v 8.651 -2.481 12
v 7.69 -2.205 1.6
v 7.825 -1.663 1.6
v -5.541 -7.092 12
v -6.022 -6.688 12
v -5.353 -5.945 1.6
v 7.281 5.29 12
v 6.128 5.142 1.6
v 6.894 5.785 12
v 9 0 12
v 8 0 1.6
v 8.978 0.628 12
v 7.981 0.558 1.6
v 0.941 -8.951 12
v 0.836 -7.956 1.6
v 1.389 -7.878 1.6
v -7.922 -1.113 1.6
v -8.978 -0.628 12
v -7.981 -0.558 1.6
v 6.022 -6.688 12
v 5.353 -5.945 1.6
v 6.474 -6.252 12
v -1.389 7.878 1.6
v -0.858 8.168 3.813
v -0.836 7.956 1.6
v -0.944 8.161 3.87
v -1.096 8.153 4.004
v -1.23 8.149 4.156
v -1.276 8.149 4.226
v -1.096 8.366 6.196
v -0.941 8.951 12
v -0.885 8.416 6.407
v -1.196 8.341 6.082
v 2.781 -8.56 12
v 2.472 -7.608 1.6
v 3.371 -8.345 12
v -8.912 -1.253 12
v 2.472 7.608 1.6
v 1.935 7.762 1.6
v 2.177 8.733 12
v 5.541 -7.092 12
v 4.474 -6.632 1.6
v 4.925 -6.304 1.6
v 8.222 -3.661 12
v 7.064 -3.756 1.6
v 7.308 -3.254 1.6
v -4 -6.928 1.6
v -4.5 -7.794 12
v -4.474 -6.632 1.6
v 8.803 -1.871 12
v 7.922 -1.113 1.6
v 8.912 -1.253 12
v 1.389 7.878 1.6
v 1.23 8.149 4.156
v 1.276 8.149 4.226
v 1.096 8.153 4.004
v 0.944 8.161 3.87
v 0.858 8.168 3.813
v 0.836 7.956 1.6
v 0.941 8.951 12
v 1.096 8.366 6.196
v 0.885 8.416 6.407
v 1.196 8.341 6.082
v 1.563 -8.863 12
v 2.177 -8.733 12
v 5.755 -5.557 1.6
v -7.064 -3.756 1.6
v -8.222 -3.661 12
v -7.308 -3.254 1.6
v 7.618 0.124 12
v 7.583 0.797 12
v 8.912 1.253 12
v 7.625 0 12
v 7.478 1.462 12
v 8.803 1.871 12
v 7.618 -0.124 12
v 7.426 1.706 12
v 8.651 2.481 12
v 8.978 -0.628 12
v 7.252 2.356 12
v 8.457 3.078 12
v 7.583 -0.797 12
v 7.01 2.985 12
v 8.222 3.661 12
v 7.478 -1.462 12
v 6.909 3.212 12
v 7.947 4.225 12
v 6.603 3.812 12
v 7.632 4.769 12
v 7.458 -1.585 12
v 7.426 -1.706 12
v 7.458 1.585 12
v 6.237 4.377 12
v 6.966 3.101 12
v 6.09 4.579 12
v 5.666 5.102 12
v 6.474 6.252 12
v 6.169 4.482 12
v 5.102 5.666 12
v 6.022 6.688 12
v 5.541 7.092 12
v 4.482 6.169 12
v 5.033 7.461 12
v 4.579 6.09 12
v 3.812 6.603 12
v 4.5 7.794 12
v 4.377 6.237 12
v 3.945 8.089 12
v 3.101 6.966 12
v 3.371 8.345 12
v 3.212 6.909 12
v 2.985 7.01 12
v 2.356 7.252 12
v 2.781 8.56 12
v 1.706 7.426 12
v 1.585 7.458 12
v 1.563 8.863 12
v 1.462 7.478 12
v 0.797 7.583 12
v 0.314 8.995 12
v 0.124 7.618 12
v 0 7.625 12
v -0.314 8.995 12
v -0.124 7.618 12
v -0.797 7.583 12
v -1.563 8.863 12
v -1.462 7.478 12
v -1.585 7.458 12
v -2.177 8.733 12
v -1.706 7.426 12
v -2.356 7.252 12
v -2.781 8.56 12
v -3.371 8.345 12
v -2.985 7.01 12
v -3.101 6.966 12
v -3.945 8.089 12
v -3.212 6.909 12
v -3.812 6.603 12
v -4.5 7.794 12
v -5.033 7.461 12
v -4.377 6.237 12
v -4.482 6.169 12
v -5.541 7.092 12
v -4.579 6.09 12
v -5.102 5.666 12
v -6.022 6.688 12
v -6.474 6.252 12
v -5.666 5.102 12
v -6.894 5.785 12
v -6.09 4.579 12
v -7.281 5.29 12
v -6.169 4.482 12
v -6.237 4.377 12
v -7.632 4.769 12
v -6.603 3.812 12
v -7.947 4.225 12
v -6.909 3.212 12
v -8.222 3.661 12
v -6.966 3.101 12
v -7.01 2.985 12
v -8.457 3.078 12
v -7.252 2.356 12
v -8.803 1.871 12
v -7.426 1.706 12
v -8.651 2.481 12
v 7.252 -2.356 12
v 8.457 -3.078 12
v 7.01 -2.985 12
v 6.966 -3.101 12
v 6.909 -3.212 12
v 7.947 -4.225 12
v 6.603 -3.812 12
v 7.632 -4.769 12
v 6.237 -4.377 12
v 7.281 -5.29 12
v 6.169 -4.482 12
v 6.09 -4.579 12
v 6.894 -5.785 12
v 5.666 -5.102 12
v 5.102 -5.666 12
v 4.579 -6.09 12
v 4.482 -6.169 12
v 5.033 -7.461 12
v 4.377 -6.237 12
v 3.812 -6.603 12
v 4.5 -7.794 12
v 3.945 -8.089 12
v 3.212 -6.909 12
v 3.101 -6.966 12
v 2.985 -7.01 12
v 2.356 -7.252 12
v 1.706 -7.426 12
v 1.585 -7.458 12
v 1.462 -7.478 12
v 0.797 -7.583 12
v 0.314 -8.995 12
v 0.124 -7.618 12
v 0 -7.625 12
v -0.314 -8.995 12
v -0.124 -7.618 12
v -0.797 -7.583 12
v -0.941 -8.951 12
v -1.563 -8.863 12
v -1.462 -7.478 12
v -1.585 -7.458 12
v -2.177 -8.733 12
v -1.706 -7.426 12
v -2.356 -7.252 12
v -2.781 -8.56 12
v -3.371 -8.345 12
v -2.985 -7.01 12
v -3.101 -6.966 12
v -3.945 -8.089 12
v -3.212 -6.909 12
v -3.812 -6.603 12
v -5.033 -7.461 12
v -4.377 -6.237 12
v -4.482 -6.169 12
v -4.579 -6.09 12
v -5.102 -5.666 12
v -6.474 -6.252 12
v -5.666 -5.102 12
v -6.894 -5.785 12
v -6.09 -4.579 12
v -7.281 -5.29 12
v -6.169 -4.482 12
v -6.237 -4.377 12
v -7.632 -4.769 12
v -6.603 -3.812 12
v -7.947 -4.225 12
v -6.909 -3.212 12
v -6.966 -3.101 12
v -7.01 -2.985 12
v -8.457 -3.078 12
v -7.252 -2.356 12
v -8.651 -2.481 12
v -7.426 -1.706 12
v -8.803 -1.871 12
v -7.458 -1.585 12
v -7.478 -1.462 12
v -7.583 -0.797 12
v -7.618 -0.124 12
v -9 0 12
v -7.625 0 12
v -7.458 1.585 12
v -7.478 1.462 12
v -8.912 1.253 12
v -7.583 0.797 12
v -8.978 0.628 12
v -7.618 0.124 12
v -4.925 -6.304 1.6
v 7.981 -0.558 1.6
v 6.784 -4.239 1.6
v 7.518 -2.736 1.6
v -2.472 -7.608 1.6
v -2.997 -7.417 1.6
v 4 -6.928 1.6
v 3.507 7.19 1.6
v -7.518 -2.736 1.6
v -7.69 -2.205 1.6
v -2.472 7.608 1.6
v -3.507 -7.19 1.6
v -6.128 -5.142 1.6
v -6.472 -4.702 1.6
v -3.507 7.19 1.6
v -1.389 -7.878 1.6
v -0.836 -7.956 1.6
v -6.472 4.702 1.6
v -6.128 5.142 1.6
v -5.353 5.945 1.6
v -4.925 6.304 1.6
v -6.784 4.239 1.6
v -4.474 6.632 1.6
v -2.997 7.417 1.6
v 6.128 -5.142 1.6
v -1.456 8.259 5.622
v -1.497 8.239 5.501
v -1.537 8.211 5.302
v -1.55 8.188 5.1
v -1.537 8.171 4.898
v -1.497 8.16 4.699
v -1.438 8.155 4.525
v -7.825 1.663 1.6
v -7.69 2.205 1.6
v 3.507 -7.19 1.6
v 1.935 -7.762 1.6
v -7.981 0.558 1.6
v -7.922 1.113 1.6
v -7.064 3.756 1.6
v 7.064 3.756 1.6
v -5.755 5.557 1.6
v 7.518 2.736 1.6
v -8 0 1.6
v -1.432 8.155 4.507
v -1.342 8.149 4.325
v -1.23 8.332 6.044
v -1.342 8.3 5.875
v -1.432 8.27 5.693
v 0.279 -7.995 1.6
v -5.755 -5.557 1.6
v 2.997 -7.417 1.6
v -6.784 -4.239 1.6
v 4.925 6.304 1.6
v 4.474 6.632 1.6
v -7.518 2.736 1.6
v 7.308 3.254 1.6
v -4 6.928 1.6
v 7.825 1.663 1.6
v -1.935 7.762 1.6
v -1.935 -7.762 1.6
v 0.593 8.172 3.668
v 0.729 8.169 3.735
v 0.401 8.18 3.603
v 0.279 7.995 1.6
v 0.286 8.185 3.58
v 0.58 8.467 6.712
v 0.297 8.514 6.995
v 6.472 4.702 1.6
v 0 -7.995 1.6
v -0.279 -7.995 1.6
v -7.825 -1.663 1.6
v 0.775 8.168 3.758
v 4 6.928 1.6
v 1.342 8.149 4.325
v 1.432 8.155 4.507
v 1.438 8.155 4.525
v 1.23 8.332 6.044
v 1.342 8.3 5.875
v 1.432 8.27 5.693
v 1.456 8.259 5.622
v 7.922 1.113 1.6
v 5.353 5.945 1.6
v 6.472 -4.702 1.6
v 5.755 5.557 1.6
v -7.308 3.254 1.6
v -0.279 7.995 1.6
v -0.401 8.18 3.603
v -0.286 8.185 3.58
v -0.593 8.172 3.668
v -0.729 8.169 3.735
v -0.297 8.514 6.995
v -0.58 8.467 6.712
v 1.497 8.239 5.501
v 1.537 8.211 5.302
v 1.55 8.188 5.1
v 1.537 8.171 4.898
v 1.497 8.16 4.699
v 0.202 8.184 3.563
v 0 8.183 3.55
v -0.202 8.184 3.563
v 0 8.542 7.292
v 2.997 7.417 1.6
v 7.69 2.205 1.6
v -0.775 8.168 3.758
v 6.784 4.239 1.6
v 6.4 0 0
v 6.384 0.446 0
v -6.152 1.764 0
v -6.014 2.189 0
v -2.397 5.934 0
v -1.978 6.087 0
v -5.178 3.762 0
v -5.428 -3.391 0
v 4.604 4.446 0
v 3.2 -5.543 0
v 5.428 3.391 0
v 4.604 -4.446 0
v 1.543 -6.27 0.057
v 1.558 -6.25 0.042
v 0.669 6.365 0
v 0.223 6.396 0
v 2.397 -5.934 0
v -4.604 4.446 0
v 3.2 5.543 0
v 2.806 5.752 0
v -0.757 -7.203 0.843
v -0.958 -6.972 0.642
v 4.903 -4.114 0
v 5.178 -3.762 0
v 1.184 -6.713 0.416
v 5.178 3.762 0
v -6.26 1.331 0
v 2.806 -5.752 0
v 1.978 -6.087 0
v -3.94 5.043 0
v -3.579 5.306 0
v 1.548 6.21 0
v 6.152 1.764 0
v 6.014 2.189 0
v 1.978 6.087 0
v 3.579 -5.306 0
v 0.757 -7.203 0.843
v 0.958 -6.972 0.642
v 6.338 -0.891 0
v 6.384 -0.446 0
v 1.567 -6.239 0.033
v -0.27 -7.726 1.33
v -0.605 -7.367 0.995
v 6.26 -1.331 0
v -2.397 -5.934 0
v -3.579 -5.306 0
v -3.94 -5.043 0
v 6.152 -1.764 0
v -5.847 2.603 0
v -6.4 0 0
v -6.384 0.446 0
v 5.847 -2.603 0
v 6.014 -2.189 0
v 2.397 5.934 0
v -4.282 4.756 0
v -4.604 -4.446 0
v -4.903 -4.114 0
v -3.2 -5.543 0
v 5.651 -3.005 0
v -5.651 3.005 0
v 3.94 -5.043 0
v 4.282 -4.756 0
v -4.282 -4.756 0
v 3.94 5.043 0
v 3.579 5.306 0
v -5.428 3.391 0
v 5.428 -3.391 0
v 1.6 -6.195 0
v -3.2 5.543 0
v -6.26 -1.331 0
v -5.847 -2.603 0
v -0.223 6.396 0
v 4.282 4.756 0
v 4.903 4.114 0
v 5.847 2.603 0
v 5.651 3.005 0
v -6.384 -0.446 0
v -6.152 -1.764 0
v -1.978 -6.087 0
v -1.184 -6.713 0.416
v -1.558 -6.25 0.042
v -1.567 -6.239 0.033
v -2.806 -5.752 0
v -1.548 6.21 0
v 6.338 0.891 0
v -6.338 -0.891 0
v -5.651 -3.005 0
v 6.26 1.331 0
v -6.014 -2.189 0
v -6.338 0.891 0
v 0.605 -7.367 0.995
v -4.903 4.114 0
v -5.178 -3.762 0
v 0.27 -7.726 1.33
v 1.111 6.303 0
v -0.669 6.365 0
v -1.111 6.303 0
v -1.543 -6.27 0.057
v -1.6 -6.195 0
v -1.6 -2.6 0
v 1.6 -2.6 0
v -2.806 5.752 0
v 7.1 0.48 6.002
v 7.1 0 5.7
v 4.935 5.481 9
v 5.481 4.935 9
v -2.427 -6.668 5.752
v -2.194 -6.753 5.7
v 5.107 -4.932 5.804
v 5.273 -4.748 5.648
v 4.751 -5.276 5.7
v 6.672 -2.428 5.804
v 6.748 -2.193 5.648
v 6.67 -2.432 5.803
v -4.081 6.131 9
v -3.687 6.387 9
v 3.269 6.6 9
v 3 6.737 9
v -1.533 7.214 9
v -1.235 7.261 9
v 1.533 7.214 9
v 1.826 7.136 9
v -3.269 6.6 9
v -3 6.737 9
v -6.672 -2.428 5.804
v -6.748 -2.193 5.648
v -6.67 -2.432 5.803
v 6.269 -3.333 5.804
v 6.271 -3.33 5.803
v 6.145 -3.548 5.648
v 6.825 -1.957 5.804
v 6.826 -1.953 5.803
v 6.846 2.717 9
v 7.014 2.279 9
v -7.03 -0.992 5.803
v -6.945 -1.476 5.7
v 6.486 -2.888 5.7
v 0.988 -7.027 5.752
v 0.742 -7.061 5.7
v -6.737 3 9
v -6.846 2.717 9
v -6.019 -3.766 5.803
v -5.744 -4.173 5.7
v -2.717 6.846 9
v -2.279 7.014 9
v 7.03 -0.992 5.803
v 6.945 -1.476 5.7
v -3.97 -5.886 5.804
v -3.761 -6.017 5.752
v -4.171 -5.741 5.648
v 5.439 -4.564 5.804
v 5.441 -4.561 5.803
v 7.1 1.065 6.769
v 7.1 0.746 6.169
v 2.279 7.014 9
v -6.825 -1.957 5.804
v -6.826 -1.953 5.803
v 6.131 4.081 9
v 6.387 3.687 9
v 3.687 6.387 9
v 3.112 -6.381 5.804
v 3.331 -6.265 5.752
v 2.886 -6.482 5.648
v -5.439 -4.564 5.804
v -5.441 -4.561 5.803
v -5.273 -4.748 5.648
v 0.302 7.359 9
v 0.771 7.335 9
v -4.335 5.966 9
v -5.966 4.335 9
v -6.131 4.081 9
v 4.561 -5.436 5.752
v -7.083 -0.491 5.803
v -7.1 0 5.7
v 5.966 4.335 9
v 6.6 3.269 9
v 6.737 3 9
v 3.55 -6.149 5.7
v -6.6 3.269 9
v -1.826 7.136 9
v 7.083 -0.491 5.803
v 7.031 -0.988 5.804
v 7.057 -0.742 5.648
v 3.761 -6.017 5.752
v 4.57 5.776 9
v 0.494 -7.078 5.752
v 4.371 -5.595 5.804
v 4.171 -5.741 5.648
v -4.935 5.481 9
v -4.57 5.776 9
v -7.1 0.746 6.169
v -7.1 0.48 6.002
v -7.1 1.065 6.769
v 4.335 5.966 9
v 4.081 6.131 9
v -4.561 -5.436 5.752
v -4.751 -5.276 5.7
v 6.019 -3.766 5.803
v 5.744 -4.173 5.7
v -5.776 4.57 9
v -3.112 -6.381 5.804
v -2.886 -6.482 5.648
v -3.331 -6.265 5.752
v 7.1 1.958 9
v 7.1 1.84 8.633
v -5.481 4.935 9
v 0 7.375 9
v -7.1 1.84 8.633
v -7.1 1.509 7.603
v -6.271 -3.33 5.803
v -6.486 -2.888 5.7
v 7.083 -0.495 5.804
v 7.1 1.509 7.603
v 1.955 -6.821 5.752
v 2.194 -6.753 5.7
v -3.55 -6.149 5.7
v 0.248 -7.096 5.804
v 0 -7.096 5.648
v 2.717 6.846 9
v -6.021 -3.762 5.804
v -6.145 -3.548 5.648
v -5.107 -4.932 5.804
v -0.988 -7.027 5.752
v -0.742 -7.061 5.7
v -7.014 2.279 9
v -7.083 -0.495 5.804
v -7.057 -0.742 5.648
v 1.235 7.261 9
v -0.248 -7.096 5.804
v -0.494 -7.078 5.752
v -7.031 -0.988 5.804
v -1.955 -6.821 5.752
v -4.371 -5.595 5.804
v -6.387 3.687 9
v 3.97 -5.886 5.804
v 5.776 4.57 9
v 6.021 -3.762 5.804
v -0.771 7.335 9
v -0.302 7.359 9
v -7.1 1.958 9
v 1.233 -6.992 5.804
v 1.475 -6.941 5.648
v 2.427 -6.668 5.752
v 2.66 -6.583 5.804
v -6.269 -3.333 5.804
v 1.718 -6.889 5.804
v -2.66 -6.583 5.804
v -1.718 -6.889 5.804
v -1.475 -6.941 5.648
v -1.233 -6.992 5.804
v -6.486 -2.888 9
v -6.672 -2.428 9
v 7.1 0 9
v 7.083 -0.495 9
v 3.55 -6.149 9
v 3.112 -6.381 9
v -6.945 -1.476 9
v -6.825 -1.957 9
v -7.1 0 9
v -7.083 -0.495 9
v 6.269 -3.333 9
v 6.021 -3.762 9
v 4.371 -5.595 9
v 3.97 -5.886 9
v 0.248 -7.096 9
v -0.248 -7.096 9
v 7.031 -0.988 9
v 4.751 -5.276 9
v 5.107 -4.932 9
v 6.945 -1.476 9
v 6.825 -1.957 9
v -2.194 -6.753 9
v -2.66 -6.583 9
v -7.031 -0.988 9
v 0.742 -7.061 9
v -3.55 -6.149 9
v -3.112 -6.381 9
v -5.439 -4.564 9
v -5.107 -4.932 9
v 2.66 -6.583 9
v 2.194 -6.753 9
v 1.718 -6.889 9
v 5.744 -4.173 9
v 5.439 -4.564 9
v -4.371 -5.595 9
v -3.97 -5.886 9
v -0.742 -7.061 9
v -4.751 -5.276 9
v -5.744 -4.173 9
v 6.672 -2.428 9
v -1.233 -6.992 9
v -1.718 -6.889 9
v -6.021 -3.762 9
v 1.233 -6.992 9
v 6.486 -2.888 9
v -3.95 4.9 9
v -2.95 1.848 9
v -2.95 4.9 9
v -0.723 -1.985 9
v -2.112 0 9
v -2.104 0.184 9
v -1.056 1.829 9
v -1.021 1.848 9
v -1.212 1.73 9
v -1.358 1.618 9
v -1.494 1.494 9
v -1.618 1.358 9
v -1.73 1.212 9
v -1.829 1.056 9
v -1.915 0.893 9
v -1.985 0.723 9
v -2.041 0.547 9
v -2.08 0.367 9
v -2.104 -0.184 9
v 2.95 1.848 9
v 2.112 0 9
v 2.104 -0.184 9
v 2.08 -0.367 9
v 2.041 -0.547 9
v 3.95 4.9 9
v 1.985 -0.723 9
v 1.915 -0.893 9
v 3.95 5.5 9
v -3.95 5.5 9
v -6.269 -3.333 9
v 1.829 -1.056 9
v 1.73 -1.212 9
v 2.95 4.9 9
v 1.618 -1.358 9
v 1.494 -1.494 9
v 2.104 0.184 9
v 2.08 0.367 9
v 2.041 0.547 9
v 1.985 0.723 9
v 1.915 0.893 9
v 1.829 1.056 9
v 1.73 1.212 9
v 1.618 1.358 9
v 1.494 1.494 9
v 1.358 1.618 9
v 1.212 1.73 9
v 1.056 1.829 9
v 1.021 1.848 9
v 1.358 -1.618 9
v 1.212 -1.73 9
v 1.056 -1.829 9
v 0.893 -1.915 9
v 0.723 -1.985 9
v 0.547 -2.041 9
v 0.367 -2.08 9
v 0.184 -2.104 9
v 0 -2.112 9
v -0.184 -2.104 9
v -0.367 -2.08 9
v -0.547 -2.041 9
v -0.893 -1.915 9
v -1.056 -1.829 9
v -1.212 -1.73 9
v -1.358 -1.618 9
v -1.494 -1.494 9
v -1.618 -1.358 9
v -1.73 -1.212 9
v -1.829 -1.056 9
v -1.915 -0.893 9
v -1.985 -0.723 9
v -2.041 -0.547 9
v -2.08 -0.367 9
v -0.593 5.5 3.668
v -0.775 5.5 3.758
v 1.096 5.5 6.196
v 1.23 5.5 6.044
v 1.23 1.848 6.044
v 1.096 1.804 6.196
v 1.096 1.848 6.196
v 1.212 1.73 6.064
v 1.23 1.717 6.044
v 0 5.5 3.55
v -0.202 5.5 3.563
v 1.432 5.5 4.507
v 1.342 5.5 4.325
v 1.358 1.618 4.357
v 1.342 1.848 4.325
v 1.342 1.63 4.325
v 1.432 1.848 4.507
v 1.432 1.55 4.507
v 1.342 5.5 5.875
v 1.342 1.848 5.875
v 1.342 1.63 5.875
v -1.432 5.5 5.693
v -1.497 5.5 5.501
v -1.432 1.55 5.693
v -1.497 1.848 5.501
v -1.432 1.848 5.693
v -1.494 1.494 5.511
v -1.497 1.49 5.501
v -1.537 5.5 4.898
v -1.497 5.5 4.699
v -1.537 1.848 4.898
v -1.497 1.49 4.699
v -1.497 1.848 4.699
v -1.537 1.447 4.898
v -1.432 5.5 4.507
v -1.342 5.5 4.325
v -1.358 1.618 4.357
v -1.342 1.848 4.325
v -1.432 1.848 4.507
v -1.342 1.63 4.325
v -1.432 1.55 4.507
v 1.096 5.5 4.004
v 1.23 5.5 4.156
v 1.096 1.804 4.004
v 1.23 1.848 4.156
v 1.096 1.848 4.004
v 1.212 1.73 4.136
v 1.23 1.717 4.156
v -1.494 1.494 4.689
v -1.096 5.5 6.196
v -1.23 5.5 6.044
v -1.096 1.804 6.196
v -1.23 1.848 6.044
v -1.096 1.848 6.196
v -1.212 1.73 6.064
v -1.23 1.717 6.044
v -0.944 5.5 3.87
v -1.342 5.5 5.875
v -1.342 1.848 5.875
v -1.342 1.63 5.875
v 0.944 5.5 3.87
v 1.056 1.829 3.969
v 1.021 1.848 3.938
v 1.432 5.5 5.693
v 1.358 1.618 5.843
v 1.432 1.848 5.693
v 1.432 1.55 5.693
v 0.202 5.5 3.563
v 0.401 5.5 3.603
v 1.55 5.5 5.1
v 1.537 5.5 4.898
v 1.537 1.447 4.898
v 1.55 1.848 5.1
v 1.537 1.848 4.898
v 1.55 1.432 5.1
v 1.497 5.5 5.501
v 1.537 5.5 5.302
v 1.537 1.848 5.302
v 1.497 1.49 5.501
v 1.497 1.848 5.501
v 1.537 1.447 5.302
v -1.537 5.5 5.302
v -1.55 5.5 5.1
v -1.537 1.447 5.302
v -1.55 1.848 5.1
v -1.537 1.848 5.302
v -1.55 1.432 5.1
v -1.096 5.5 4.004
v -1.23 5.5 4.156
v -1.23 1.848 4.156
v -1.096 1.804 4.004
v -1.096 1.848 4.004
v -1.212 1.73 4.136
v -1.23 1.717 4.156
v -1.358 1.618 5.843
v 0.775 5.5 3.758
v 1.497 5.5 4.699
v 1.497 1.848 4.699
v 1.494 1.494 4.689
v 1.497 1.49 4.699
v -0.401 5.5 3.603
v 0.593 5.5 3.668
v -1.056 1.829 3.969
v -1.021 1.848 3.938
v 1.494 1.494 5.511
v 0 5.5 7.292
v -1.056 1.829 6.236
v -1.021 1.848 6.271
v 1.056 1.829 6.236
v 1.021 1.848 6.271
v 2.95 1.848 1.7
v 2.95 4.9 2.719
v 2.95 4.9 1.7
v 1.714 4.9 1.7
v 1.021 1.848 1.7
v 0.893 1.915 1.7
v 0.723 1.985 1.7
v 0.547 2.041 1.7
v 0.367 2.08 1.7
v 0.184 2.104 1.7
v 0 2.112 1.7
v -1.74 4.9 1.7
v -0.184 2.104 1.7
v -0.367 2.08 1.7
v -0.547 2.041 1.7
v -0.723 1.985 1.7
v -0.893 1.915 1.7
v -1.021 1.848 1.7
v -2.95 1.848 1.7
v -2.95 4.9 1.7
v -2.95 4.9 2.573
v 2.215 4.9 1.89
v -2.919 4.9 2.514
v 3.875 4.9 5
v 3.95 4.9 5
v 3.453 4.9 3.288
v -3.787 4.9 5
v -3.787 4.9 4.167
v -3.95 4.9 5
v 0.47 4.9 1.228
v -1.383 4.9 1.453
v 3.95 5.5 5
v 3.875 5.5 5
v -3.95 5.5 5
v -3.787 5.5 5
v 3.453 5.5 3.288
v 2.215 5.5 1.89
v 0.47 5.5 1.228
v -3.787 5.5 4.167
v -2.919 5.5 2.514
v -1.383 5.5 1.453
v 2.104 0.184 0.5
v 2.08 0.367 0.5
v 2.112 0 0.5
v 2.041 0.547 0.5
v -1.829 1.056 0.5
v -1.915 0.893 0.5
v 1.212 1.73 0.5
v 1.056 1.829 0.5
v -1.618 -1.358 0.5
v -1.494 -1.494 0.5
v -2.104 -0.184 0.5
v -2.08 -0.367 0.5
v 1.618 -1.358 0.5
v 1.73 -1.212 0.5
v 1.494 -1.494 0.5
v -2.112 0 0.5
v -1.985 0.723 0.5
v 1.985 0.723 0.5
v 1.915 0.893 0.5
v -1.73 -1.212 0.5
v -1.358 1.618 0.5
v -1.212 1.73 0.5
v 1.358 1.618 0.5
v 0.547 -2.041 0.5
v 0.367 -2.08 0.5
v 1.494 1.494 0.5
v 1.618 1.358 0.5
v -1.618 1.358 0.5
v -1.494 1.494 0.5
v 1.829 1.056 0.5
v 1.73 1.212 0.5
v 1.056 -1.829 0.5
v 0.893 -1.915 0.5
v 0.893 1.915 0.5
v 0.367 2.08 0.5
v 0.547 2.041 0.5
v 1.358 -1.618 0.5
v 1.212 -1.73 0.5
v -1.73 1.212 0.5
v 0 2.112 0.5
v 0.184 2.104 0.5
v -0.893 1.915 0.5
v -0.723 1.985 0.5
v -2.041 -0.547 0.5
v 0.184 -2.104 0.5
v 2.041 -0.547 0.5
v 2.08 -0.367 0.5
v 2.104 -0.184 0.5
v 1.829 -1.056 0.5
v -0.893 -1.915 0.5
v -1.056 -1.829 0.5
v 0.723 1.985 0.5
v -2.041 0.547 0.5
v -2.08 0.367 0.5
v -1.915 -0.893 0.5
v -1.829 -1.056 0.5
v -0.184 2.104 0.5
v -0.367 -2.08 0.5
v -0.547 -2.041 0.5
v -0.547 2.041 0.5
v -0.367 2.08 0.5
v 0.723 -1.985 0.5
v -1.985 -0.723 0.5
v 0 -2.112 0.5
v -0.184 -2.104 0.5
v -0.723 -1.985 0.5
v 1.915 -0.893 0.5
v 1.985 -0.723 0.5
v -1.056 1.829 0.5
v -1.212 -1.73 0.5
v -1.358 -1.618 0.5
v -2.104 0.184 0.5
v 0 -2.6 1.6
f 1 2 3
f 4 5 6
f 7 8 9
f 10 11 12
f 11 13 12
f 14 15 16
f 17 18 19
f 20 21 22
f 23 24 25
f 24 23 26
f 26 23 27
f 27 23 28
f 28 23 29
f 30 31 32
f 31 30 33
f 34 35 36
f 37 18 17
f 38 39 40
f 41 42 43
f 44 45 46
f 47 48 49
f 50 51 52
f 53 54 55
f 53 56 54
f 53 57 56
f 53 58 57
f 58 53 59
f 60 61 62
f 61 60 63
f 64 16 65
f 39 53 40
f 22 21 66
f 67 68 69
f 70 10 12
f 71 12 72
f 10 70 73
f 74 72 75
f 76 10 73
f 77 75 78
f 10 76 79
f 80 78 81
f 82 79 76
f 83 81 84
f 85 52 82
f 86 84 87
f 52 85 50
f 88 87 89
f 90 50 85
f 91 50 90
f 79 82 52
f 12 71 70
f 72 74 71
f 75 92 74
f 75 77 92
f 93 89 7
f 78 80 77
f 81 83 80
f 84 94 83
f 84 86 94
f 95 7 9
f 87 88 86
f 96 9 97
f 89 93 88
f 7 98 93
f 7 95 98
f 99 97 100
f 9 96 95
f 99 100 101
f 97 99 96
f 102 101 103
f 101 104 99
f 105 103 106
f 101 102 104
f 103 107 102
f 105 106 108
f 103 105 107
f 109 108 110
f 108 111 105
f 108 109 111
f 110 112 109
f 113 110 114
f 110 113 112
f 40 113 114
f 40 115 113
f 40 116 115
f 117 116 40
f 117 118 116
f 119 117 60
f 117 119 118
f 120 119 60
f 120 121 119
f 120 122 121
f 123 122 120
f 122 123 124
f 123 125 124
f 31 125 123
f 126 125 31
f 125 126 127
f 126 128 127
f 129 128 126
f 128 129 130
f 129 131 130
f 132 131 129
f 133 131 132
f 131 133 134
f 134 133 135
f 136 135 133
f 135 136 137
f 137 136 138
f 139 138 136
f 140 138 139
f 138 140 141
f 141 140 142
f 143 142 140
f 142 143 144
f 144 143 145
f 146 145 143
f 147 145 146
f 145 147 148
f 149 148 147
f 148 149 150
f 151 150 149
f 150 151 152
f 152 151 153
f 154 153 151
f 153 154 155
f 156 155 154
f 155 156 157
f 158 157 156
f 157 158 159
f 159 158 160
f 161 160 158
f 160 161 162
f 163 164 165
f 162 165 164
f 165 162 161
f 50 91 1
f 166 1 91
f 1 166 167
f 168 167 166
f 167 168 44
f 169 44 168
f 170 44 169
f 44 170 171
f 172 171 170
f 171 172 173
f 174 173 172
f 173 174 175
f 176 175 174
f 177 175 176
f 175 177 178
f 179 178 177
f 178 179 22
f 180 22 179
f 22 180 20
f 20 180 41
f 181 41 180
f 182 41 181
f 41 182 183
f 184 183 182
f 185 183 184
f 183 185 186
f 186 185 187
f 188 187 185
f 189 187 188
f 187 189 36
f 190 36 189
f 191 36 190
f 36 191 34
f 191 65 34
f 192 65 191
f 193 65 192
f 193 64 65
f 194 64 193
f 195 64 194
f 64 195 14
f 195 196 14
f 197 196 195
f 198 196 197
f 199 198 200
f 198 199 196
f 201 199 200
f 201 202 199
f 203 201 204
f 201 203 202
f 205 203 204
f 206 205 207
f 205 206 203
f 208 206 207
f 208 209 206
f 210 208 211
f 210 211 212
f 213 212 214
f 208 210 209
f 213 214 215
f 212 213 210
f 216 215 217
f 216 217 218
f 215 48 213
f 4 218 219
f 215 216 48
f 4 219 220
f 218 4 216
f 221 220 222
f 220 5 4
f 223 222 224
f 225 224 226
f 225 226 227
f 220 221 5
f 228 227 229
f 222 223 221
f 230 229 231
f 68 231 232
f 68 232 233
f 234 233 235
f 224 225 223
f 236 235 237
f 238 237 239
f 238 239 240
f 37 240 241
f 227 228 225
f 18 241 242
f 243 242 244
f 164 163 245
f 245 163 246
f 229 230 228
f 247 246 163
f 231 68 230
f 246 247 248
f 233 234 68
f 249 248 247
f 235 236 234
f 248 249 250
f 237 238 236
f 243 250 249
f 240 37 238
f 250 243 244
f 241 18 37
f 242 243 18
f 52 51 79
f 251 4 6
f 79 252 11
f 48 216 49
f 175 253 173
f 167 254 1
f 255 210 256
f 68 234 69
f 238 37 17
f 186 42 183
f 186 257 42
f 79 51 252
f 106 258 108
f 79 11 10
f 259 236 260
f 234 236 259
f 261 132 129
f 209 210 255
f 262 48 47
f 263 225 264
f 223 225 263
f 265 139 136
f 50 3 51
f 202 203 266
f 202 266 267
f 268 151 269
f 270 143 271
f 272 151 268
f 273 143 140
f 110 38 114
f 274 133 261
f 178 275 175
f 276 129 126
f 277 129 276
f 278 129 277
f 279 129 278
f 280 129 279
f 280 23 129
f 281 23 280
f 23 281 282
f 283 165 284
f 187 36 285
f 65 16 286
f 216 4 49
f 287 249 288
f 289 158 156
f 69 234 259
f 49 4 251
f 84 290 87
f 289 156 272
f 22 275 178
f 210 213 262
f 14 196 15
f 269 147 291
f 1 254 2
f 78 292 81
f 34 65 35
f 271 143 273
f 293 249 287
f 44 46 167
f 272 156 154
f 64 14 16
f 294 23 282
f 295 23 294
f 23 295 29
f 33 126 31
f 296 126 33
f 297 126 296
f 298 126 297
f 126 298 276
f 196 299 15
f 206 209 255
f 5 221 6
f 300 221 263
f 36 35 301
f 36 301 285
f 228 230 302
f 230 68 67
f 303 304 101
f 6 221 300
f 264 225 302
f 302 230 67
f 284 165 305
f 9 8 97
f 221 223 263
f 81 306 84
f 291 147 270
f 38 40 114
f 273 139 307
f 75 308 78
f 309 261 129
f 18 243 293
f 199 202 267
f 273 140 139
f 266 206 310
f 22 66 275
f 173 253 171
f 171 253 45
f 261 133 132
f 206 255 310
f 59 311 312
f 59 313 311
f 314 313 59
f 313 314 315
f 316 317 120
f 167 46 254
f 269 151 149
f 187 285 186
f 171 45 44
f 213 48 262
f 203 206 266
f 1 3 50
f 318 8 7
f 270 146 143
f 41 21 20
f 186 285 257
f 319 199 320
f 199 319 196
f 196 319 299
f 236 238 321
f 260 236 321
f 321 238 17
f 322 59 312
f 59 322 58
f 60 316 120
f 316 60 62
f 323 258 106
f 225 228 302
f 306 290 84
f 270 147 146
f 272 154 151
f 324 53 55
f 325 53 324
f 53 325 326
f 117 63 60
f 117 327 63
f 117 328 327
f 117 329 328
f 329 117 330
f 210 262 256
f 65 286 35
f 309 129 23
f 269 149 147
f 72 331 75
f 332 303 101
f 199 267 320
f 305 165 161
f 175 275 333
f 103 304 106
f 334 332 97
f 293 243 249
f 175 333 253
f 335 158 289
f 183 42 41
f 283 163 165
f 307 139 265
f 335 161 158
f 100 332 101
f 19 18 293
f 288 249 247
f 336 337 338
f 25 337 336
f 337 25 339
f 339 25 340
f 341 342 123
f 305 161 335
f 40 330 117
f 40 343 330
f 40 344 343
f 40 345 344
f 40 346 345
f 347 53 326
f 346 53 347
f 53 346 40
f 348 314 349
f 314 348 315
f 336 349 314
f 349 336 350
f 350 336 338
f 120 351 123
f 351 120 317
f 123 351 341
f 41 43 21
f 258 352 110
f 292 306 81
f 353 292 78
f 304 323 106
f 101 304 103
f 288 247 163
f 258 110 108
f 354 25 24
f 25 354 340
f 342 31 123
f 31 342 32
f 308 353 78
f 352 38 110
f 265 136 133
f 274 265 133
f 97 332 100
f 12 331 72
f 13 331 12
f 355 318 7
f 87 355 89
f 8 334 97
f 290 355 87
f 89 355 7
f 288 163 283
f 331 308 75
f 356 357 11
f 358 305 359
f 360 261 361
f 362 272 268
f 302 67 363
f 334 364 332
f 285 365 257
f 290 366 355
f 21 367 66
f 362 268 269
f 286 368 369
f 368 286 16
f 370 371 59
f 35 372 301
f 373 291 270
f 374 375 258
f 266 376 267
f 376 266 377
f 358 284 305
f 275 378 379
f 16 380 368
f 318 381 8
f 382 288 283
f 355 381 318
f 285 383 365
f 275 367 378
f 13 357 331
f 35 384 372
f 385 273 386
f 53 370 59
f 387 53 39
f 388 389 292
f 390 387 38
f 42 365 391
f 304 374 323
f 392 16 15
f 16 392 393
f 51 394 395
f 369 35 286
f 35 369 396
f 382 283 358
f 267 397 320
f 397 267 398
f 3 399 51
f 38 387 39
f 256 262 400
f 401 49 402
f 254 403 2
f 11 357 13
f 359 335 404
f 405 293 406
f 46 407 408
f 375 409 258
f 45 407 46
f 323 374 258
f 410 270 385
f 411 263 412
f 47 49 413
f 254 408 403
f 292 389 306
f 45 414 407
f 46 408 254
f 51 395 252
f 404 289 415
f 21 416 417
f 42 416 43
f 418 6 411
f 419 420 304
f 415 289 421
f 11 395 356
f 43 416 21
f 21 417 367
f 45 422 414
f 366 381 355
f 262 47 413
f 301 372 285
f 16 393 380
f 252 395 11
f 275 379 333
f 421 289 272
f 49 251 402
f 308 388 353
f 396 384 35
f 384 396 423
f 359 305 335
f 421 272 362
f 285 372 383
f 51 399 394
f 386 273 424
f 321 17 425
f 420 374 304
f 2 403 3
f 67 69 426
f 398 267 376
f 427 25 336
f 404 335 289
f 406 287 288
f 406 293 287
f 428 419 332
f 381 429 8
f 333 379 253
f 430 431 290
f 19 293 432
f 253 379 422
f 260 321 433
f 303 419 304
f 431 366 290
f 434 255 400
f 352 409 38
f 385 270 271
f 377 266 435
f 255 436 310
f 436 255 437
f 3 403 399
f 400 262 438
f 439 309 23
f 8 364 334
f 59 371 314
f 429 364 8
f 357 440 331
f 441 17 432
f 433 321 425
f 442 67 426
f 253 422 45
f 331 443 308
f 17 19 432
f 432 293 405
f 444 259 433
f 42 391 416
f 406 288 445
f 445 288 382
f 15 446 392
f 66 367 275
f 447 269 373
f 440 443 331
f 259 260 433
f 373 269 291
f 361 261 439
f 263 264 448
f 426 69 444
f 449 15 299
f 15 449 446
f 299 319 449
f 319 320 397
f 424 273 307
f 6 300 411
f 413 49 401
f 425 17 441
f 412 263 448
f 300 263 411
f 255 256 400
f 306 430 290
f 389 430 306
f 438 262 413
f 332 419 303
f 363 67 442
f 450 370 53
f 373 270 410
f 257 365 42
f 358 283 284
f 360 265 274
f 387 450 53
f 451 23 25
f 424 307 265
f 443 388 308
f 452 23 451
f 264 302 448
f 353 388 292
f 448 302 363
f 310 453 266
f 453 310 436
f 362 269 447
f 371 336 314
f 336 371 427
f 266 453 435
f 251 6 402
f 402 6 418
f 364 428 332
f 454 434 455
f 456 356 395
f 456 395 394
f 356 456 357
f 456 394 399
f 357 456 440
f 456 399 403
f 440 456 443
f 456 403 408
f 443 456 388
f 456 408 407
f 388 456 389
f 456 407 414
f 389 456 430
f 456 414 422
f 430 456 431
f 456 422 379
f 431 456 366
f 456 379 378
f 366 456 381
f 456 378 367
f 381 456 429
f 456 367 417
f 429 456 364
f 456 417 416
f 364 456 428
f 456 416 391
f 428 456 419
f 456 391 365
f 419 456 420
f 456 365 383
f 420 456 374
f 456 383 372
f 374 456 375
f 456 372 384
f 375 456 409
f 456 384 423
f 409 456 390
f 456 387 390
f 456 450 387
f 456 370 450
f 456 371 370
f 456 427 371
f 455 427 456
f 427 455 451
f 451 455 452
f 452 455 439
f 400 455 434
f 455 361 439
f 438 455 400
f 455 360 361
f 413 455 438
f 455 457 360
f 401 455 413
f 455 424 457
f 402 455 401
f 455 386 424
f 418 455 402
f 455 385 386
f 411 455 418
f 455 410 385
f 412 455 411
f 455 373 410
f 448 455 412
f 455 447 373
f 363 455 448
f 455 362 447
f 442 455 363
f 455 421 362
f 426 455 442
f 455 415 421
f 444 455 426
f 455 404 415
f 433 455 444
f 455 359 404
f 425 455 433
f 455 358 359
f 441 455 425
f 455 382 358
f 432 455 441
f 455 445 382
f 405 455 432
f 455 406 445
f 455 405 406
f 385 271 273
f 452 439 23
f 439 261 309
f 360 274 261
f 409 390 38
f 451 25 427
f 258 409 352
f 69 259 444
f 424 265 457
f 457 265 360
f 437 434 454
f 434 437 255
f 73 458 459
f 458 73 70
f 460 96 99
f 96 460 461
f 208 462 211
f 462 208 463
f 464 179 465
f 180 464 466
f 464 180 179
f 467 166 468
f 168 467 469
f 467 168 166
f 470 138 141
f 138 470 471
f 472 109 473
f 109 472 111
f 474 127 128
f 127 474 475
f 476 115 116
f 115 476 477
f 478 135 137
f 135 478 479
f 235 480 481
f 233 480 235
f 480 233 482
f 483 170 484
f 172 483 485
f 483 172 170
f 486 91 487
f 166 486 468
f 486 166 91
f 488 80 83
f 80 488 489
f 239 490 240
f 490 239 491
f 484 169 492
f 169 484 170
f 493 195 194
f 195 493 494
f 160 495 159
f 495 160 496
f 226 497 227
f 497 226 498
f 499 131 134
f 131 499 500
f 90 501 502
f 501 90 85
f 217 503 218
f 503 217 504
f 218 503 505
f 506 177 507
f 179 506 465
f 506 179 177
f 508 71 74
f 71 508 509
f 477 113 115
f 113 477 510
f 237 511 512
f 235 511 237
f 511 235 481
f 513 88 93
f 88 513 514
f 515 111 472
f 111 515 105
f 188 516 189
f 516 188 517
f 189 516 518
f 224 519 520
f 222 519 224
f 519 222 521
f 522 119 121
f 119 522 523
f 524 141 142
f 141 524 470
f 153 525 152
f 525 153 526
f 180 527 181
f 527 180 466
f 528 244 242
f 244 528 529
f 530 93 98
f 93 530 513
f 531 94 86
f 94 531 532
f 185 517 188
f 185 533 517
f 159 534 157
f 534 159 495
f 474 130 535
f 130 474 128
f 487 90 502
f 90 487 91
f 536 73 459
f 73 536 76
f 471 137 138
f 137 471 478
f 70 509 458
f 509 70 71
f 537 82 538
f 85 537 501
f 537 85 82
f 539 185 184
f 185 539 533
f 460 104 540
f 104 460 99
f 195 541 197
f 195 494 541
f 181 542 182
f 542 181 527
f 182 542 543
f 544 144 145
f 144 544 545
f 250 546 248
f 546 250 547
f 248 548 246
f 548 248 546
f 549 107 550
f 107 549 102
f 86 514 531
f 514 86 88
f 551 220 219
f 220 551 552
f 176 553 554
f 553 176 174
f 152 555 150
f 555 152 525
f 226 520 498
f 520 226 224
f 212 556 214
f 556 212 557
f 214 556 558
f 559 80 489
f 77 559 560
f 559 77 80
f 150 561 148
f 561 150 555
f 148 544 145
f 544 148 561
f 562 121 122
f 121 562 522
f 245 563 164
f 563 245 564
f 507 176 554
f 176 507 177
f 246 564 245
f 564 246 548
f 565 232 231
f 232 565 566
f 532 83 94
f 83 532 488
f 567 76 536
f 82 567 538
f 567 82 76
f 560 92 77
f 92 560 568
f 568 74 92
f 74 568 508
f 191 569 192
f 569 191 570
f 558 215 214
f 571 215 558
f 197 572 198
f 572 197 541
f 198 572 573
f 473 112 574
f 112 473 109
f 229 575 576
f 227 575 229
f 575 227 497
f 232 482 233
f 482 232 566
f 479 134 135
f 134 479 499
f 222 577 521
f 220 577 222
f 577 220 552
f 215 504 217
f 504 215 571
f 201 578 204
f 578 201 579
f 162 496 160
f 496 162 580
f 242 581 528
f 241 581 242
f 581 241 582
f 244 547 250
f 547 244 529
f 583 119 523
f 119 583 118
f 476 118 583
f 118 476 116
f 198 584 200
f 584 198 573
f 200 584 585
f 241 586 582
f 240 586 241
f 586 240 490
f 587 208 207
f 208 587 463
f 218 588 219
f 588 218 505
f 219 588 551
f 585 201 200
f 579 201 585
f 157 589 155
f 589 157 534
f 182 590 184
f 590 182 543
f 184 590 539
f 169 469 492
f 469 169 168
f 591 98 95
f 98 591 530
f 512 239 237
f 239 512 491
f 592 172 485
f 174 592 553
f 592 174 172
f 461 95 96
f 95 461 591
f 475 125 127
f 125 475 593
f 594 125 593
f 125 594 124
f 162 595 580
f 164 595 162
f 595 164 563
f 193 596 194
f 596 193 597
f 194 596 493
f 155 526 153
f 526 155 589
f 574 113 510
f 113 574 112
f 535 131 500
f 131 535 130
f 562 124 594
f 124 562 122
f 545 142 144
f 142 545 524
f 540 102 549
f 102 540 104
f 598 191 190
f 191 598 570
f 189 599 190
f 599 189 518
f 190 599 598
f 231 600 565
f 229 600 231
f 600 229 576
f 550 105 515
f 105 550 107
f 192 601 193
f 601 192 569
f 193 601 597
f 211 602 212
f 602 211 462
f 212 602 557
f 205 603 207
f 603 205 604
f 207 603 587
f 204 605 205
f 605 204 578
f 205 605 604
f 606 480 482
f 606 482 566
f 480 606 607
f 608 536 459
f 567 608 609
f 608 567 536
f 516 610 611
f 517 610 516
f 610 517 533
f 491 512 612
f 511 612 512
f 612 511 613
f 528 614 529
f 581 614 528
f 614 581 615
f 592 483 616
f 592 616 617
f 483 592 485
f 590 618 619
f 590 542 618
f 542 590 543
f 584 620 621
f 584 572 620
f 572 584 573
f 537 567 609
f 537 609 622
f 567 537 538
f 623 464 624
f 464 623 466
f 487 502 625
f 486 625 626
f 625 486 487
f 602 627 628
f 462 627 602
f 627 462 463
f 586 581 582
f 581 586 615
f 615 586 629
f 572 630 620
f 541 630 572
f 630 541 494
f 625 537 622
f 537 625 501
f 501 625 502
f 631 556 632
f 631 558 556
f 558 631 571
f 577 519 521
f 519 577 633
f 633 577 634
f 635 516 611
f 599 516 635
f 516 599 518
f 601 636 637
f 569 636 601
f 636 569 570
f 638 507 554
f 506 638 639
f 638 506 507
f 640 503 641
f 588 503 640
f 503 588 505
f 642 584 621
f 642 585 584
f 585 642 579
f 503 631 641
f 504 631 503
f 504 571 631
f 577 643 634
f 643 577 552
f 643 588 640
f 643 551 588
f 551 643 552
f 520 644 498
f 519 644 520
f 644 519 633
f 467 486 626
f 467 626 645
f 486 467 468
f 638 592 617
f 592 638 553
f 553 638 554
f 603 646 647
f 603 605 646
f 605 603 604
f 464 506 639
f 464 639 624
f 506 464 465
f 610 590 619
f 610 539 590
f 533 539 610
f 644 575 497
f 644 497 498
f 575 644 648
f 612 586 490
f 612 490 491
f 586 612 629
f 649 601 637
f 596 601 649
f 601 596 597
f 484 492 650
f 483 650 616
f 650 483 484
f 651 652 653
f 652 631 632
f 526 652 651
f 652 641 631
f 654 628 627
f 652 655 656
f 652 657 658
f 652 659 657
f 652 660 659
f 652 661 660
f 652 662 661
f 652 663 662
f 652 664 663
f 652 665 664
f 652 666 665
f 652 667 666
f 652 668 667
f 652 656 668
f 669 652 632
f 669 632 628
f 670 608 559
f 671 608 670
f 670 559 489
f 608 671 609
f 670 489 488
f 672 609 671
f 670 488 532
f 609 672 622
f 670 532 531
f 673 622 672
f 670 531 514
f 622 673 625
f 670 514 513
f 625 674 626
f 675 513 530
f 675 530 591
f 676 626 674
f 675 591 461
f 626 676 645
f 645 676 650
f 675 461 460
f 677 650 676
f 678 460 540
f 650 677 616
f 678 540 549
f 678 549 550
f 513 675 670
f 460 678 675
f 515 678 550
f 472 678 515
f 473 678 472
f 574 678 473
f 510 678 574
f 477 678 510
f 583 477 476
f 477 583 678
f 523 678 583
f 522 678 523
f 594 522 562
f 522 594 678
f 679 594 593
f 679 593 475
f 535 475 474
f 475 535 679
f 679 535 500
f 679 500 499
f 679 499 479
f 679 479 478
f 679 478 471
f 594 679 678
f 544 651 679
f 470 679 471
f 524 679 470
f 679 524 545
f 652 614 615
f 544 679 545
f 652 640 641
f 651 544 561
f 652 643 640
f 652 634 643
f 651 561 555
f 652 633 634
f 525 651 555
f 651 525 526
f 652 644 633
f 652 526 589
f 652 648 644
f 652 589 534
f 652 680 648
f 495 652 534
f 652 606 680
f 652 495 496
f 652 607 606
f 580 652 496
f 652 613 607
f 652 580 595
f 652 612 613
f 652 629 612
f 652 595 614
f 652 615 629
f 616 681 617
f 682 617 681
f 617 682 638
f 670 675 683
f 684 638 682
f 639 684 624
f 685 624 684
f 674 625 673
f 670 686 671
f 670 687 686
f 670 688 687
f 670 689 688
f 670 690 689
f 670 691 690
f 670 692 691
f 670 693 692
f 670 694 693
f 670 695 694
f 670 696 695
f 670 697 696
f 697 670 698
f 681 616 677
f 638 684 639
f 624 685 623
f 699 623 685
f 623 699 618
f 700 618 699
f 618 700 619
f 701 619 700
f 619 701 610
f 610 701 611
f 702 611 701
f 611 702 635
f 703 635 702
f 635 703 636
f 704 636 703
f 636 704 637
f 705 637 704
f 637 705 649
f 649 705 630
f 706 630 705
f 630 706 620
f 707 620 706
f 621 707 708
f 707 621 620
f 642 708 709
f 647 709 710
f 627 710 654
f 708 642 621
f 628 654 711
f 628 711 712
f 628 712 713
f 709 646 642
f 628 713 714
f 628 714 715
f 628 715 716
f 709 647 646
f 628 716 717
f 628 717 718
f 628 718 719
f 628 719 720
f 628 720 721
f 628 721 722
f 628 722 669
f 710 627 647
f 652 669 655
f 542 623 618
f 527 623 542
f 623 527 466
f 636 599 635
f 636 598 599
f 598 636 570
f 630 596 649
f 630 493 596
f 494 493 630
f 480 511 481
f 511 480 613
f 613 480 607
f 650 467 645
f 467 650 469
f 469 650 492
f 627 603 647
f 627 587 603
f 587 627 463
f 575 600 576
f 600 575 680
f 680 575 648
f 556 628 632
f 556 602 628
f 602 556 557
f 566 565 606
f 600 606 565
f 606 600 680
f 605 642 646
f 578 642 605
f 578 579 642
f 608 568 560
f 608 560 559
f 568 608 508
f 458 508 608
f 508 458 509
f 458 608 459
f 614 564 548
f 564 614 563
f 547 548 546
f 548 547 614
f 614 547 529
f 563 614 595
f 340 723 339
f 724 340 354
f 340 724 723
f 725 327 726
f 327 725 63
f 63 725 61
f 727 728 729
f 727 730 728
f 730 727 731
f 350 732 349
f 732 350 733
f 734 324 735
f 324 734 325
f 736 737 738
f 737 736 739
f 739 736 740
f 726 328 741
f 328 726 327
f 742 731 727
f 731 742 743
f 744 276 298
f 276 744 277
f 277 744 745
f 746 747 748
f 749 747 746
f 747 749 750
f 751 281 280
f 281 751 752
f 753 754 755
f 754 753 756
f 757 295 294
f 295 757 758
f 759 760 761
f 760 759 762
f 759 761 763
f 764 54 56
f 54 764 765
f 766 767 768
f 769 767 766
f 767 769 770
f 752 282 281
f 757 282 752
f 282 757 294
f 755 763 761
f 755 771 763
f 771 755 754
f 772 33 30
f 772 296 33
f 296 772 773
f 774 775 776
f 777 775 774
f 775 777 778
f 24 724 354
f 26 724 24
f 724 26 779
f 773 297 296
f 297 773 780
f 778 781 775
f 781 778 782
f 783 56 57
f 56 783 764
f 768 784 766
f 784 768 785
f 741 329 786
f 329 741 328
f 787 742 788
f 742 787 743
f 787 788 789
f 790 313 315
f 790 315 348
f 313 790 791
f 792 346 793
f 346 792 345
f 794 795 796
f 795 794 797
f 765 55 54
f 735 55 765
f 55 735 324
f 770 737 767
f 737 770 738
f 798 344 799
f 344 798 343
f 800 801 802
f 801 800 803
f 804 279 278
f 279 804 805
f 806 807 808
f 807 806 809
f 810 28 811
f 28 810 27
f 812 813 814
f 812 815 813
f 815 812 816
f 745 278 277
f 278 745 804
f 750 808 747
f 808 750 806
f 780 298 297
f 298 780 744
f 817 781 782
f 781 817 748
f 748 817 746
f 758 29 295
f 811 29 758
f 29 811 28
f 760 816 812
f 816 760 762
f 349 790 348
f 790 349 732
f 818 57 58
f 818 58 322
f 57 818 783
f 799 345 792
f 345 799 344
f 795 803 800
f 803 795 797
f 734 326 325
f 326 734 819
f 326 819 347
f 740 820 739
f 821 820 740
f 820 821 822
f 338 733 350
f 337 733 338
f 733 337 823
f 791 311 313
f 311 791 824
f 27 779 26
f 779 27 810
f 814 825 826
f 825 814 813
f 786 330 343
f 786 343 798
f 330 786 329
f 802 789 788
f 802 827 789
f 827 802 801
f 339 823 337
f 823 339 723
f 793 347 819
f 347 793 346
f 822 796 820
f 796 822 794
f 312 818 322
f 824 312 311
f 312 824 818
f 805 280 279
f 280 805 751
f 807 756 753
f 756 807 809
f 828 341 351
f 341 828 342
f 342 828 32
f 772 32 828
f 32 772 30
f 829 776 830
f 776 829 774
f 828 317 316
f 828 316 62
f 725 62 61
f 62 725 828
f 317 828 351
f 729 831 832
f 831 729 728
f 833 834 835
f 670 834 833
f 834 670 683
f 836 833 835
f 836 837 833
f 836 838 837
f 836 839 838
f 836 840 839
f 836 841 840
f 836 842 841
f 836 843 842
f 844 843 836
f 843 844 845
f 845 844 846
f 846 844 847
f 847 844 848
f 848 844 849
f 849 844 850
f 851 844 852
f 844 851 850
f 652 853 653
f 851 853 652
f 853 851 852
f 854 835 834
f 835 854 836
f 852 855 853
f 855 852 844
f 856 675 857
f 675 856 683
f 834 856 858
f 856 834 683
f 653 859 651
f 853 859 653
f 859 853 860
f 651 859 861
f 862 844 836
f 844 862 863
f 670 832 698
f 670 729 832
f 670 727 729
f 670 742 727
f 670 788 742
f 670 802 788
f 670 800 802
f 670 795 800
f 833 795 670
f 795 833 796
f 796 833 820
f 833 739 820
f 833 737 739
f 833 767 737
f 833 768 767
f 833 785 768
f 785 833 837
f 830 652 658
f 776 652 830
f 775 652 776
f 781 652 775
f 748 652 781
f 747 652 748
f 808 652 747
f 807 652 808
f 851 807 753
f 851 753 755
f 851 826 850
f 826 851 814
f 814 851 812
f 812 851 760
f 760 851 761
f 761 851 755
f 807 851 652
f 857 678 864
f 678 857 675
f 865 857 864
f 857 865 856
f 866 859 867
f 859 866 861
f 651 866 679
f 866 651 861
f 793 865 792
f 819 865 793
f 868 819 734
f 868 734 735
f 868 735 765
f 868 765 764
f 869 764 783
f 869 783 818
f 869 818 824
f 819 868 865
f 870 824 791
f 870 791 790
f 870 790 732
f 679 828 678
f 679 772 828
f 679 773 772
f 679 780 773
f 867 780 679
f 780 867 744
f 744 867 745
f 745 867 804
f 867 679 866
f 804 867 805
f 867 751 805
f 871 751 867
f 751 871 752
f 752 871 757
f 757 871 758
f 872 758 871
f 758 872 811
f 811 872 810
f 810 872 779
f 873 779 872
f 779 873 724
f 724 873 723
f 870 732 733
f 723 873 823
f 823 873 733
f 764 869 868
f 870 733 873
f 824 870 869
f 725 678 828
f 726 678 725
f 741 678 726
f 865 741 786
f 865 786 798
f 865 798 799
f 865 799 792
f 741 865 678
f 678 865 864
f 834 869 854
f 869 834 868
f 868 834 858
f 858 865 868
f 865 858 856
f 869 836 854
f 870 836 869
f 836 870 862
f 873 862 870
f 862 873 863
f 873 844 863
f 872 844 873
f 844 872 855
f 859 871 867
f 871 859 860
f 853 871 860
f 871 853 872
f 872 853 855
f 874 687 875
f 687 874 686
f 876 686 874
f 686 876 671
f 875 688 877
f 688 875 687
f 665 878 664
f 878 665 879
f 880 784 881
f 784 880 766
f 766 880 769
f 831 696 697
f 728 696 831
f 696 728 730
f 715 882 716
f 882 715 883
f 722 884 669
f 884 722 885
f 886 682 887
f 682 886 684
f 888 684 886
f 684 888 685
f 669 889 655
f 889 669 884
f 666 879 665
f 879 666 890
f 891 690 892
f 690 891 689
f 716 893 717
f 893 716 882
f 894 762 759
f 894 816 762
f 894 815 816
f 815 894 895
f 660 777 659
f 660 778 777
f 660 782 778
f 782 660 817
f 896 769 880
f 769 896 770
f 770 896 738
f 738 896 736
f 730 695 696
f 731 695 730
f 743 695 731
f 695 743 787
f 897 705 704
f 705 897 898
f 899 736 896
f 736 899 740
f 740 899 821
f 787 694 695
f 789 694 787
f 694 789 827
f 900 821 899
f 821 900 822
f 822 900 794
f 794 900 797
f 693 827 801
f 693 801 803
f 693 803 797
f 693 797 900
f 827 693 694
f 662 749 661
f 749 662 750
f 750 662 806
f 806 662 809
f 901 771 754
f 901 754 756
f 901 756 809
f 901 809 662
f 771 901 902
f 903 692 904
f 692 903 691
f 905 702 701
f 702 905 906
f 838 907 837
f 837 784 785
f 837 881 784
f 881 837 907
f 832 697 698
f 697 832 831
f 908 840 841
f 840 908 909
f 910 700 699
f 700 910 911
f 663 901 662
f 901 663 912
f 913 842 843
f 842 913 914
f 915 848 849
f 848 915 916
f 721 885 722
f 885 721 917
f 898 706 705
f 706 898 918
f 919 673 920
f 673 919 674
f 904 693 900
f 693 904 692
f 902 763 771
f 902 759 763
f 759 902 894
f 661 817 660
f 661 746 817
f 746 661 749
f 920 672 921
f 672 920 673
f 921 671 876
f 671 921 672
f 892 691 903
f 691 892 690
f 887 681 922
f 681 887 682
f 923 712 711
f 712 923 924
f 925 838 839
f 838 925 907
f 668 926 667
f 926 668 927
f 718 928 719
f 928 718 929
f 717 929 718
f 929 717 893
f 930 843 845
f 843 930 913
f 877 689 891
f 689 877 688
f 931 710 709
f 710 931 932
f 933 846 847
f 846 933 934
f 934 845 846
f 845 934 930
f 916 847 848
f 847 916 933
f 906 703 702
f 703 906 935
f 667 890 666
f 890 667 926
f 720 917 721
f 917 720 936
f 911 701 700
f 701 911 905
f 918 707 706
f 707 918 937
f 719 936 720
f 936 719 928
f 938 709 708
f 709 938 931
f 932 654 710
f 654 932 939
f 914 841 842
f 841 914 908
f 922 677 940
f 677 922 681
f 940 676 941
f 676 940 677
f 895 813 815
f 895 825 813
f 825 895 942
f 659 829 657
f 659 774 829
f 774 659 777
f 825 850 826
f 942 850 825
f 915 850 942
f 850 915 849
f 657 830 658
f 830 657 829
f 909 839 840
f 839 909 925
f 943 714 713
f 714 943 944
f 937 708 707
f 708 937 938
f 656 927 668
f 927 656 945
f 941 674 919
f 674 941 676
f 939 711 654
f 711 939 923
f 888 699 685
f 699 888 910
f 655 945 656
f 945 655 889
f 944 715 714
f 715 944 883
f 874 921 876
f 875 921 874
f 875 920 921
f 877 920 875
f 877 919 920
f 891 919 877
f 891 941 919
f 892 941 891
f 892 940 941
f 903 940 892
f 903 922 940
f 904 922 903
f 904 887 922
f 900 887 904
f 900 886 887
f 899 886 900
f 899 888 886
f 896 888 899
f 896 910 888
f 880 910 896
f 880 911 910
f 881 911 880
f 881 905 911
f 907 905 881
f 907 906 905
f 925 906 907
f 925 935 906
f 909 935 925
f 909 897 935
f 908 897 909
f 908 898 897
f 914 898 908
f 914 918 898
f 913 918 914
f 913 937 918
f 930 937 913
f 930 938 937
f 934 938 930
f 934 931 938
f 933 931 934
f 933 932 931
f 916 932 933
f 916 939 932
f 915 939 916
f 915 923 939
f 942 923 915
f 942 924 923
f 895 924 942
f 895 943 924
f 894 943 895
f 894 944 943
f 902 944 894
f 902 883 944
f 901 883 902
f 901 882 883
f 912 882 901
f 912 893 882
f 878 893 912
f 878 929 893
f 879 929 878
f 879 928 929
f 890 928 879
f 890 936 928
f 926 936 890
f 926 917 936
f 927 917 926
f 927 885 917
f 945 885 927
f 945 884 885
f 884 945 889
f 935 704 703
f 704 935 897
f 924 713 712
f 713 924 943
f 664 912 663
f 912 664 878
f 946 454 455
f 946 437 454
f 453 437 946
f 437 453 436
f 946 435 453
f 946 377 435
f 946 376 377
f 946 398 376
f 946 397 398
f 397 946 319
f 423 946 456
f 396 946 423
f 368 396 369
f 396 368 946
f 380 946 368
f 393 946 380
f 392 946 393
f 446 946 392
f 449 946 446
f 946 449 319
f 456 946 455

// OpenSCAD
/*

    **** ROBUST PARAMETRIC KNOB FOR ROTARY CONTROLS *****

    Torbjorn Skauli (tskauli@gmail.com)
    August 2018, released in the public domain.

This is a rotary knob such as those used for volume controls. The shape of the knob can be adjusted, mainly by changing its outer diameter, height and taper towards the top. It is also possible to add an arrow indicator on the top surface, and the shape can be made faceted rather than round. A bevelled edge around the top is also adjustable in the code.

The knob normally uses a set screw from the side. The screw is held by a nut resting on a washer, to ensure strength that allows for tightening. Either a headless setscrew can be used, or an optional recess for a flat head screw can be enabled. It is also possible to disable the screw and nut holes, for press fit on the shaft The inner structures can be recessed into the knob to enclose the mounting nut of the shaft in the panel.

The knob is designed to be printed upside down, and does not need any support material on printers capable of printing a 45-degree overhang, thanks to teardrop-shaped holes.

To assemble, first insert a washer and a nut in their slots, and then thread the screw in from the side. The washer may need to be pressed in with some force using pliers, depending on the accuracy of the print. If using a headed screw, the knob looks nicest if the screw length is such that the head is approximately flush with the outer surface when tightened.

*/
has_setscrew=1; // [ 1:include a set screw, 0:only shaft hole ]
has_arrow=1;    // [ 1:include an indicator arrow, 2:plain top ]
has_screwhead=0;// [ 1:screw with head - enlarged hole, 0:hex socket set screw ]

// No. of outer facets, or =0 if smooth
facets=0;       

// Pot/encoder axis diameter
axdia=4.2; // 6.3 for volume, 4.1 for power switch     

// Knob outer diameter
outdia=18;

// Height of outer part of knob
outheig=12;     

// Recess depth inside outer shell to accommodate pot panel mount nut
innerrecess=3;

// Radius reduction for tapering of main part, =0 for cylindrical shape.
rtaper=1;       

// set screw diameter
scrdia=3;       

/* [Hidden] */
twall=1.2;      // outer wall thickness
thinwall=0.5;   // thickness at the bottom of the axis hole (to push in as far as possible)
taxis=5;        // thickness of material around axis
tol=0.025;      // tolerance for fit, adapt to printer
gap=0.1;        // loose fit, adapt to printer
cacc=6;         // SPEED / ACCURACY scaling factor for $fn etc. 1=draft, >1=final
rbevel=1.6;     // delta radius to bevel start, also depth of arrow

// Hardware dimensions (adapted from. http://www.metrication.com/engineering/fastener.html)
scrhdia=2*scrdia;       // screw head diameter
washdia=2.6*scrdia;     // washer diameter and thickness
washthic=0.5+gap;       // washer thickness
nutdia=1.9*scrdia+gap;  // nut smallest diameter
nutdiaouter=2.2*scrdia; // nut largest diameter and thickness (check)
nutthic=0.9*scrdia+gap; // nut thickness
axgapfac=0.06;          // factor to move nut room closer to axis, rel to axis radius to avoid thin walls between nut and axis

wscrbase=axdia+2*taxis; // width of screw base
lscrbase=4*scrdia;      // length of screw base
innheig=outheig-innerrecess;// height of inner part
scrheig=innheig-max(washdia/2, scrdia);// height of screw hole

module teardropHole(lh,rh){ // Hole with 45-degree teardrop shape, no support material
    rotate([0,0,-135])
    union(){
        cylinder(h=lh,r1=rh,r2=rh,$fn=8*cacc);
        cube([rh,rh,lh]);
    };
};
module outershape(){ // Outer shape of knob
    union(){
        if (facets){
            translate([0,0,rbevel])
            cylinder(r1=(outdia)/2-rtaper,r2=outdia/2,h=outheig-rbevel,$fn=facets);
            cylinder(r1=(outdia)/2-rbevel-rtaper,r2=(outdia)/2-rtaper,h=rbevel,$fn=facets);
        }
        else{
            translate([0,0,rbevel])
            cylinder(r1=(outdia)/2-rtaper,r2=outdia/2,h=outheig-rbevel,$fn=15*cacc);
            cylinder(r1=(outdia)/2-rbevel-rtaper,r2=(outdia)/2-rtaper,h=rbevel,$fn=15*cacc);
        };
        
    };
};
module cavity(){ // inner cavity, to save plastic
    translate([0,0,max(twall,rbevel+thinwall)]) // cavity to save plastic
    cylinder(r1=(outdia)/2-twall-rtaper,r2=(outdia)/2-twall,h=outheig,$fn=10*cacc);
};
module axismount(){ // axis hole and clamp screw block
    intersection(){
        union(){ 
            // axis tube
            cylinder(d=axdia+2*taxis,h=innheig,$fn=15*cacc);
            // block for nut
            if (has_setscrew)
                translate([-wscrbase/2,0,0])
                cube([wscrbase,outdia/2,innheig]);
        };
        // ensure fit within outer shape
        outershape();
    };
};
module holes(){ // shapes to be carved out of the knob
    // axis hole
    translate([0,0,thinwall]) 
    cylinder(d=axdia+tol,h=innheig,$fn=12*cacc);

    // arrow indicator
    if (has_arrow)
        translate([0,-max(outdia/8,axdia/2+thinwall),0])
        rotate([90,0,0])
        cylinder(r=rbevel,h=outdia,$fn=4);
    
    // holes and recesses for screw, nut and washer
    if (has_setscrew) {
        // screw hole
        translate([0,0,scrheig])
        rotate([-90,0,0])
        teardropHole(rh=(scrdia+gap)/2,lh=outdia);
        
        //nut recess
        translate([-(nutdia+gap)/2,axdia*(0.5-axgapfac),scrheig-nutdiaouter/2-gap])
        cube([nutdia+gap,nutthic+axdia*axgapfac,outheig]);
        
        
        // washer recess, lower part
        translate([-(washdia+gap)/2,axdia/2+nutthic,scrheig-0*washdia/2-gap])
        cube([washdia+gap,washthic,outheig]);
        
        // washer recess, upper part
        translate([0,axdia/2+nutthic,scrheig])
        rotate([-90,0,0])
        #cylinder(d=washdia,h=washthic);

        // screw head recess
        if (has_screwhead)
            translate([0,axdia/2+nutthic+washthic+scrdia,scrheig])
            rotate([-90,0,0]) 
            teardropHole(rh=(scrhdia+gap)/2,lh=outdia);
    };
  
};
difference(){ // screw holes and arrow erosion
    union(){ // shell and screw mount
        difference(){
            outershape();
            cavity();
        };
        axismount();    

    };
        holes();
};
